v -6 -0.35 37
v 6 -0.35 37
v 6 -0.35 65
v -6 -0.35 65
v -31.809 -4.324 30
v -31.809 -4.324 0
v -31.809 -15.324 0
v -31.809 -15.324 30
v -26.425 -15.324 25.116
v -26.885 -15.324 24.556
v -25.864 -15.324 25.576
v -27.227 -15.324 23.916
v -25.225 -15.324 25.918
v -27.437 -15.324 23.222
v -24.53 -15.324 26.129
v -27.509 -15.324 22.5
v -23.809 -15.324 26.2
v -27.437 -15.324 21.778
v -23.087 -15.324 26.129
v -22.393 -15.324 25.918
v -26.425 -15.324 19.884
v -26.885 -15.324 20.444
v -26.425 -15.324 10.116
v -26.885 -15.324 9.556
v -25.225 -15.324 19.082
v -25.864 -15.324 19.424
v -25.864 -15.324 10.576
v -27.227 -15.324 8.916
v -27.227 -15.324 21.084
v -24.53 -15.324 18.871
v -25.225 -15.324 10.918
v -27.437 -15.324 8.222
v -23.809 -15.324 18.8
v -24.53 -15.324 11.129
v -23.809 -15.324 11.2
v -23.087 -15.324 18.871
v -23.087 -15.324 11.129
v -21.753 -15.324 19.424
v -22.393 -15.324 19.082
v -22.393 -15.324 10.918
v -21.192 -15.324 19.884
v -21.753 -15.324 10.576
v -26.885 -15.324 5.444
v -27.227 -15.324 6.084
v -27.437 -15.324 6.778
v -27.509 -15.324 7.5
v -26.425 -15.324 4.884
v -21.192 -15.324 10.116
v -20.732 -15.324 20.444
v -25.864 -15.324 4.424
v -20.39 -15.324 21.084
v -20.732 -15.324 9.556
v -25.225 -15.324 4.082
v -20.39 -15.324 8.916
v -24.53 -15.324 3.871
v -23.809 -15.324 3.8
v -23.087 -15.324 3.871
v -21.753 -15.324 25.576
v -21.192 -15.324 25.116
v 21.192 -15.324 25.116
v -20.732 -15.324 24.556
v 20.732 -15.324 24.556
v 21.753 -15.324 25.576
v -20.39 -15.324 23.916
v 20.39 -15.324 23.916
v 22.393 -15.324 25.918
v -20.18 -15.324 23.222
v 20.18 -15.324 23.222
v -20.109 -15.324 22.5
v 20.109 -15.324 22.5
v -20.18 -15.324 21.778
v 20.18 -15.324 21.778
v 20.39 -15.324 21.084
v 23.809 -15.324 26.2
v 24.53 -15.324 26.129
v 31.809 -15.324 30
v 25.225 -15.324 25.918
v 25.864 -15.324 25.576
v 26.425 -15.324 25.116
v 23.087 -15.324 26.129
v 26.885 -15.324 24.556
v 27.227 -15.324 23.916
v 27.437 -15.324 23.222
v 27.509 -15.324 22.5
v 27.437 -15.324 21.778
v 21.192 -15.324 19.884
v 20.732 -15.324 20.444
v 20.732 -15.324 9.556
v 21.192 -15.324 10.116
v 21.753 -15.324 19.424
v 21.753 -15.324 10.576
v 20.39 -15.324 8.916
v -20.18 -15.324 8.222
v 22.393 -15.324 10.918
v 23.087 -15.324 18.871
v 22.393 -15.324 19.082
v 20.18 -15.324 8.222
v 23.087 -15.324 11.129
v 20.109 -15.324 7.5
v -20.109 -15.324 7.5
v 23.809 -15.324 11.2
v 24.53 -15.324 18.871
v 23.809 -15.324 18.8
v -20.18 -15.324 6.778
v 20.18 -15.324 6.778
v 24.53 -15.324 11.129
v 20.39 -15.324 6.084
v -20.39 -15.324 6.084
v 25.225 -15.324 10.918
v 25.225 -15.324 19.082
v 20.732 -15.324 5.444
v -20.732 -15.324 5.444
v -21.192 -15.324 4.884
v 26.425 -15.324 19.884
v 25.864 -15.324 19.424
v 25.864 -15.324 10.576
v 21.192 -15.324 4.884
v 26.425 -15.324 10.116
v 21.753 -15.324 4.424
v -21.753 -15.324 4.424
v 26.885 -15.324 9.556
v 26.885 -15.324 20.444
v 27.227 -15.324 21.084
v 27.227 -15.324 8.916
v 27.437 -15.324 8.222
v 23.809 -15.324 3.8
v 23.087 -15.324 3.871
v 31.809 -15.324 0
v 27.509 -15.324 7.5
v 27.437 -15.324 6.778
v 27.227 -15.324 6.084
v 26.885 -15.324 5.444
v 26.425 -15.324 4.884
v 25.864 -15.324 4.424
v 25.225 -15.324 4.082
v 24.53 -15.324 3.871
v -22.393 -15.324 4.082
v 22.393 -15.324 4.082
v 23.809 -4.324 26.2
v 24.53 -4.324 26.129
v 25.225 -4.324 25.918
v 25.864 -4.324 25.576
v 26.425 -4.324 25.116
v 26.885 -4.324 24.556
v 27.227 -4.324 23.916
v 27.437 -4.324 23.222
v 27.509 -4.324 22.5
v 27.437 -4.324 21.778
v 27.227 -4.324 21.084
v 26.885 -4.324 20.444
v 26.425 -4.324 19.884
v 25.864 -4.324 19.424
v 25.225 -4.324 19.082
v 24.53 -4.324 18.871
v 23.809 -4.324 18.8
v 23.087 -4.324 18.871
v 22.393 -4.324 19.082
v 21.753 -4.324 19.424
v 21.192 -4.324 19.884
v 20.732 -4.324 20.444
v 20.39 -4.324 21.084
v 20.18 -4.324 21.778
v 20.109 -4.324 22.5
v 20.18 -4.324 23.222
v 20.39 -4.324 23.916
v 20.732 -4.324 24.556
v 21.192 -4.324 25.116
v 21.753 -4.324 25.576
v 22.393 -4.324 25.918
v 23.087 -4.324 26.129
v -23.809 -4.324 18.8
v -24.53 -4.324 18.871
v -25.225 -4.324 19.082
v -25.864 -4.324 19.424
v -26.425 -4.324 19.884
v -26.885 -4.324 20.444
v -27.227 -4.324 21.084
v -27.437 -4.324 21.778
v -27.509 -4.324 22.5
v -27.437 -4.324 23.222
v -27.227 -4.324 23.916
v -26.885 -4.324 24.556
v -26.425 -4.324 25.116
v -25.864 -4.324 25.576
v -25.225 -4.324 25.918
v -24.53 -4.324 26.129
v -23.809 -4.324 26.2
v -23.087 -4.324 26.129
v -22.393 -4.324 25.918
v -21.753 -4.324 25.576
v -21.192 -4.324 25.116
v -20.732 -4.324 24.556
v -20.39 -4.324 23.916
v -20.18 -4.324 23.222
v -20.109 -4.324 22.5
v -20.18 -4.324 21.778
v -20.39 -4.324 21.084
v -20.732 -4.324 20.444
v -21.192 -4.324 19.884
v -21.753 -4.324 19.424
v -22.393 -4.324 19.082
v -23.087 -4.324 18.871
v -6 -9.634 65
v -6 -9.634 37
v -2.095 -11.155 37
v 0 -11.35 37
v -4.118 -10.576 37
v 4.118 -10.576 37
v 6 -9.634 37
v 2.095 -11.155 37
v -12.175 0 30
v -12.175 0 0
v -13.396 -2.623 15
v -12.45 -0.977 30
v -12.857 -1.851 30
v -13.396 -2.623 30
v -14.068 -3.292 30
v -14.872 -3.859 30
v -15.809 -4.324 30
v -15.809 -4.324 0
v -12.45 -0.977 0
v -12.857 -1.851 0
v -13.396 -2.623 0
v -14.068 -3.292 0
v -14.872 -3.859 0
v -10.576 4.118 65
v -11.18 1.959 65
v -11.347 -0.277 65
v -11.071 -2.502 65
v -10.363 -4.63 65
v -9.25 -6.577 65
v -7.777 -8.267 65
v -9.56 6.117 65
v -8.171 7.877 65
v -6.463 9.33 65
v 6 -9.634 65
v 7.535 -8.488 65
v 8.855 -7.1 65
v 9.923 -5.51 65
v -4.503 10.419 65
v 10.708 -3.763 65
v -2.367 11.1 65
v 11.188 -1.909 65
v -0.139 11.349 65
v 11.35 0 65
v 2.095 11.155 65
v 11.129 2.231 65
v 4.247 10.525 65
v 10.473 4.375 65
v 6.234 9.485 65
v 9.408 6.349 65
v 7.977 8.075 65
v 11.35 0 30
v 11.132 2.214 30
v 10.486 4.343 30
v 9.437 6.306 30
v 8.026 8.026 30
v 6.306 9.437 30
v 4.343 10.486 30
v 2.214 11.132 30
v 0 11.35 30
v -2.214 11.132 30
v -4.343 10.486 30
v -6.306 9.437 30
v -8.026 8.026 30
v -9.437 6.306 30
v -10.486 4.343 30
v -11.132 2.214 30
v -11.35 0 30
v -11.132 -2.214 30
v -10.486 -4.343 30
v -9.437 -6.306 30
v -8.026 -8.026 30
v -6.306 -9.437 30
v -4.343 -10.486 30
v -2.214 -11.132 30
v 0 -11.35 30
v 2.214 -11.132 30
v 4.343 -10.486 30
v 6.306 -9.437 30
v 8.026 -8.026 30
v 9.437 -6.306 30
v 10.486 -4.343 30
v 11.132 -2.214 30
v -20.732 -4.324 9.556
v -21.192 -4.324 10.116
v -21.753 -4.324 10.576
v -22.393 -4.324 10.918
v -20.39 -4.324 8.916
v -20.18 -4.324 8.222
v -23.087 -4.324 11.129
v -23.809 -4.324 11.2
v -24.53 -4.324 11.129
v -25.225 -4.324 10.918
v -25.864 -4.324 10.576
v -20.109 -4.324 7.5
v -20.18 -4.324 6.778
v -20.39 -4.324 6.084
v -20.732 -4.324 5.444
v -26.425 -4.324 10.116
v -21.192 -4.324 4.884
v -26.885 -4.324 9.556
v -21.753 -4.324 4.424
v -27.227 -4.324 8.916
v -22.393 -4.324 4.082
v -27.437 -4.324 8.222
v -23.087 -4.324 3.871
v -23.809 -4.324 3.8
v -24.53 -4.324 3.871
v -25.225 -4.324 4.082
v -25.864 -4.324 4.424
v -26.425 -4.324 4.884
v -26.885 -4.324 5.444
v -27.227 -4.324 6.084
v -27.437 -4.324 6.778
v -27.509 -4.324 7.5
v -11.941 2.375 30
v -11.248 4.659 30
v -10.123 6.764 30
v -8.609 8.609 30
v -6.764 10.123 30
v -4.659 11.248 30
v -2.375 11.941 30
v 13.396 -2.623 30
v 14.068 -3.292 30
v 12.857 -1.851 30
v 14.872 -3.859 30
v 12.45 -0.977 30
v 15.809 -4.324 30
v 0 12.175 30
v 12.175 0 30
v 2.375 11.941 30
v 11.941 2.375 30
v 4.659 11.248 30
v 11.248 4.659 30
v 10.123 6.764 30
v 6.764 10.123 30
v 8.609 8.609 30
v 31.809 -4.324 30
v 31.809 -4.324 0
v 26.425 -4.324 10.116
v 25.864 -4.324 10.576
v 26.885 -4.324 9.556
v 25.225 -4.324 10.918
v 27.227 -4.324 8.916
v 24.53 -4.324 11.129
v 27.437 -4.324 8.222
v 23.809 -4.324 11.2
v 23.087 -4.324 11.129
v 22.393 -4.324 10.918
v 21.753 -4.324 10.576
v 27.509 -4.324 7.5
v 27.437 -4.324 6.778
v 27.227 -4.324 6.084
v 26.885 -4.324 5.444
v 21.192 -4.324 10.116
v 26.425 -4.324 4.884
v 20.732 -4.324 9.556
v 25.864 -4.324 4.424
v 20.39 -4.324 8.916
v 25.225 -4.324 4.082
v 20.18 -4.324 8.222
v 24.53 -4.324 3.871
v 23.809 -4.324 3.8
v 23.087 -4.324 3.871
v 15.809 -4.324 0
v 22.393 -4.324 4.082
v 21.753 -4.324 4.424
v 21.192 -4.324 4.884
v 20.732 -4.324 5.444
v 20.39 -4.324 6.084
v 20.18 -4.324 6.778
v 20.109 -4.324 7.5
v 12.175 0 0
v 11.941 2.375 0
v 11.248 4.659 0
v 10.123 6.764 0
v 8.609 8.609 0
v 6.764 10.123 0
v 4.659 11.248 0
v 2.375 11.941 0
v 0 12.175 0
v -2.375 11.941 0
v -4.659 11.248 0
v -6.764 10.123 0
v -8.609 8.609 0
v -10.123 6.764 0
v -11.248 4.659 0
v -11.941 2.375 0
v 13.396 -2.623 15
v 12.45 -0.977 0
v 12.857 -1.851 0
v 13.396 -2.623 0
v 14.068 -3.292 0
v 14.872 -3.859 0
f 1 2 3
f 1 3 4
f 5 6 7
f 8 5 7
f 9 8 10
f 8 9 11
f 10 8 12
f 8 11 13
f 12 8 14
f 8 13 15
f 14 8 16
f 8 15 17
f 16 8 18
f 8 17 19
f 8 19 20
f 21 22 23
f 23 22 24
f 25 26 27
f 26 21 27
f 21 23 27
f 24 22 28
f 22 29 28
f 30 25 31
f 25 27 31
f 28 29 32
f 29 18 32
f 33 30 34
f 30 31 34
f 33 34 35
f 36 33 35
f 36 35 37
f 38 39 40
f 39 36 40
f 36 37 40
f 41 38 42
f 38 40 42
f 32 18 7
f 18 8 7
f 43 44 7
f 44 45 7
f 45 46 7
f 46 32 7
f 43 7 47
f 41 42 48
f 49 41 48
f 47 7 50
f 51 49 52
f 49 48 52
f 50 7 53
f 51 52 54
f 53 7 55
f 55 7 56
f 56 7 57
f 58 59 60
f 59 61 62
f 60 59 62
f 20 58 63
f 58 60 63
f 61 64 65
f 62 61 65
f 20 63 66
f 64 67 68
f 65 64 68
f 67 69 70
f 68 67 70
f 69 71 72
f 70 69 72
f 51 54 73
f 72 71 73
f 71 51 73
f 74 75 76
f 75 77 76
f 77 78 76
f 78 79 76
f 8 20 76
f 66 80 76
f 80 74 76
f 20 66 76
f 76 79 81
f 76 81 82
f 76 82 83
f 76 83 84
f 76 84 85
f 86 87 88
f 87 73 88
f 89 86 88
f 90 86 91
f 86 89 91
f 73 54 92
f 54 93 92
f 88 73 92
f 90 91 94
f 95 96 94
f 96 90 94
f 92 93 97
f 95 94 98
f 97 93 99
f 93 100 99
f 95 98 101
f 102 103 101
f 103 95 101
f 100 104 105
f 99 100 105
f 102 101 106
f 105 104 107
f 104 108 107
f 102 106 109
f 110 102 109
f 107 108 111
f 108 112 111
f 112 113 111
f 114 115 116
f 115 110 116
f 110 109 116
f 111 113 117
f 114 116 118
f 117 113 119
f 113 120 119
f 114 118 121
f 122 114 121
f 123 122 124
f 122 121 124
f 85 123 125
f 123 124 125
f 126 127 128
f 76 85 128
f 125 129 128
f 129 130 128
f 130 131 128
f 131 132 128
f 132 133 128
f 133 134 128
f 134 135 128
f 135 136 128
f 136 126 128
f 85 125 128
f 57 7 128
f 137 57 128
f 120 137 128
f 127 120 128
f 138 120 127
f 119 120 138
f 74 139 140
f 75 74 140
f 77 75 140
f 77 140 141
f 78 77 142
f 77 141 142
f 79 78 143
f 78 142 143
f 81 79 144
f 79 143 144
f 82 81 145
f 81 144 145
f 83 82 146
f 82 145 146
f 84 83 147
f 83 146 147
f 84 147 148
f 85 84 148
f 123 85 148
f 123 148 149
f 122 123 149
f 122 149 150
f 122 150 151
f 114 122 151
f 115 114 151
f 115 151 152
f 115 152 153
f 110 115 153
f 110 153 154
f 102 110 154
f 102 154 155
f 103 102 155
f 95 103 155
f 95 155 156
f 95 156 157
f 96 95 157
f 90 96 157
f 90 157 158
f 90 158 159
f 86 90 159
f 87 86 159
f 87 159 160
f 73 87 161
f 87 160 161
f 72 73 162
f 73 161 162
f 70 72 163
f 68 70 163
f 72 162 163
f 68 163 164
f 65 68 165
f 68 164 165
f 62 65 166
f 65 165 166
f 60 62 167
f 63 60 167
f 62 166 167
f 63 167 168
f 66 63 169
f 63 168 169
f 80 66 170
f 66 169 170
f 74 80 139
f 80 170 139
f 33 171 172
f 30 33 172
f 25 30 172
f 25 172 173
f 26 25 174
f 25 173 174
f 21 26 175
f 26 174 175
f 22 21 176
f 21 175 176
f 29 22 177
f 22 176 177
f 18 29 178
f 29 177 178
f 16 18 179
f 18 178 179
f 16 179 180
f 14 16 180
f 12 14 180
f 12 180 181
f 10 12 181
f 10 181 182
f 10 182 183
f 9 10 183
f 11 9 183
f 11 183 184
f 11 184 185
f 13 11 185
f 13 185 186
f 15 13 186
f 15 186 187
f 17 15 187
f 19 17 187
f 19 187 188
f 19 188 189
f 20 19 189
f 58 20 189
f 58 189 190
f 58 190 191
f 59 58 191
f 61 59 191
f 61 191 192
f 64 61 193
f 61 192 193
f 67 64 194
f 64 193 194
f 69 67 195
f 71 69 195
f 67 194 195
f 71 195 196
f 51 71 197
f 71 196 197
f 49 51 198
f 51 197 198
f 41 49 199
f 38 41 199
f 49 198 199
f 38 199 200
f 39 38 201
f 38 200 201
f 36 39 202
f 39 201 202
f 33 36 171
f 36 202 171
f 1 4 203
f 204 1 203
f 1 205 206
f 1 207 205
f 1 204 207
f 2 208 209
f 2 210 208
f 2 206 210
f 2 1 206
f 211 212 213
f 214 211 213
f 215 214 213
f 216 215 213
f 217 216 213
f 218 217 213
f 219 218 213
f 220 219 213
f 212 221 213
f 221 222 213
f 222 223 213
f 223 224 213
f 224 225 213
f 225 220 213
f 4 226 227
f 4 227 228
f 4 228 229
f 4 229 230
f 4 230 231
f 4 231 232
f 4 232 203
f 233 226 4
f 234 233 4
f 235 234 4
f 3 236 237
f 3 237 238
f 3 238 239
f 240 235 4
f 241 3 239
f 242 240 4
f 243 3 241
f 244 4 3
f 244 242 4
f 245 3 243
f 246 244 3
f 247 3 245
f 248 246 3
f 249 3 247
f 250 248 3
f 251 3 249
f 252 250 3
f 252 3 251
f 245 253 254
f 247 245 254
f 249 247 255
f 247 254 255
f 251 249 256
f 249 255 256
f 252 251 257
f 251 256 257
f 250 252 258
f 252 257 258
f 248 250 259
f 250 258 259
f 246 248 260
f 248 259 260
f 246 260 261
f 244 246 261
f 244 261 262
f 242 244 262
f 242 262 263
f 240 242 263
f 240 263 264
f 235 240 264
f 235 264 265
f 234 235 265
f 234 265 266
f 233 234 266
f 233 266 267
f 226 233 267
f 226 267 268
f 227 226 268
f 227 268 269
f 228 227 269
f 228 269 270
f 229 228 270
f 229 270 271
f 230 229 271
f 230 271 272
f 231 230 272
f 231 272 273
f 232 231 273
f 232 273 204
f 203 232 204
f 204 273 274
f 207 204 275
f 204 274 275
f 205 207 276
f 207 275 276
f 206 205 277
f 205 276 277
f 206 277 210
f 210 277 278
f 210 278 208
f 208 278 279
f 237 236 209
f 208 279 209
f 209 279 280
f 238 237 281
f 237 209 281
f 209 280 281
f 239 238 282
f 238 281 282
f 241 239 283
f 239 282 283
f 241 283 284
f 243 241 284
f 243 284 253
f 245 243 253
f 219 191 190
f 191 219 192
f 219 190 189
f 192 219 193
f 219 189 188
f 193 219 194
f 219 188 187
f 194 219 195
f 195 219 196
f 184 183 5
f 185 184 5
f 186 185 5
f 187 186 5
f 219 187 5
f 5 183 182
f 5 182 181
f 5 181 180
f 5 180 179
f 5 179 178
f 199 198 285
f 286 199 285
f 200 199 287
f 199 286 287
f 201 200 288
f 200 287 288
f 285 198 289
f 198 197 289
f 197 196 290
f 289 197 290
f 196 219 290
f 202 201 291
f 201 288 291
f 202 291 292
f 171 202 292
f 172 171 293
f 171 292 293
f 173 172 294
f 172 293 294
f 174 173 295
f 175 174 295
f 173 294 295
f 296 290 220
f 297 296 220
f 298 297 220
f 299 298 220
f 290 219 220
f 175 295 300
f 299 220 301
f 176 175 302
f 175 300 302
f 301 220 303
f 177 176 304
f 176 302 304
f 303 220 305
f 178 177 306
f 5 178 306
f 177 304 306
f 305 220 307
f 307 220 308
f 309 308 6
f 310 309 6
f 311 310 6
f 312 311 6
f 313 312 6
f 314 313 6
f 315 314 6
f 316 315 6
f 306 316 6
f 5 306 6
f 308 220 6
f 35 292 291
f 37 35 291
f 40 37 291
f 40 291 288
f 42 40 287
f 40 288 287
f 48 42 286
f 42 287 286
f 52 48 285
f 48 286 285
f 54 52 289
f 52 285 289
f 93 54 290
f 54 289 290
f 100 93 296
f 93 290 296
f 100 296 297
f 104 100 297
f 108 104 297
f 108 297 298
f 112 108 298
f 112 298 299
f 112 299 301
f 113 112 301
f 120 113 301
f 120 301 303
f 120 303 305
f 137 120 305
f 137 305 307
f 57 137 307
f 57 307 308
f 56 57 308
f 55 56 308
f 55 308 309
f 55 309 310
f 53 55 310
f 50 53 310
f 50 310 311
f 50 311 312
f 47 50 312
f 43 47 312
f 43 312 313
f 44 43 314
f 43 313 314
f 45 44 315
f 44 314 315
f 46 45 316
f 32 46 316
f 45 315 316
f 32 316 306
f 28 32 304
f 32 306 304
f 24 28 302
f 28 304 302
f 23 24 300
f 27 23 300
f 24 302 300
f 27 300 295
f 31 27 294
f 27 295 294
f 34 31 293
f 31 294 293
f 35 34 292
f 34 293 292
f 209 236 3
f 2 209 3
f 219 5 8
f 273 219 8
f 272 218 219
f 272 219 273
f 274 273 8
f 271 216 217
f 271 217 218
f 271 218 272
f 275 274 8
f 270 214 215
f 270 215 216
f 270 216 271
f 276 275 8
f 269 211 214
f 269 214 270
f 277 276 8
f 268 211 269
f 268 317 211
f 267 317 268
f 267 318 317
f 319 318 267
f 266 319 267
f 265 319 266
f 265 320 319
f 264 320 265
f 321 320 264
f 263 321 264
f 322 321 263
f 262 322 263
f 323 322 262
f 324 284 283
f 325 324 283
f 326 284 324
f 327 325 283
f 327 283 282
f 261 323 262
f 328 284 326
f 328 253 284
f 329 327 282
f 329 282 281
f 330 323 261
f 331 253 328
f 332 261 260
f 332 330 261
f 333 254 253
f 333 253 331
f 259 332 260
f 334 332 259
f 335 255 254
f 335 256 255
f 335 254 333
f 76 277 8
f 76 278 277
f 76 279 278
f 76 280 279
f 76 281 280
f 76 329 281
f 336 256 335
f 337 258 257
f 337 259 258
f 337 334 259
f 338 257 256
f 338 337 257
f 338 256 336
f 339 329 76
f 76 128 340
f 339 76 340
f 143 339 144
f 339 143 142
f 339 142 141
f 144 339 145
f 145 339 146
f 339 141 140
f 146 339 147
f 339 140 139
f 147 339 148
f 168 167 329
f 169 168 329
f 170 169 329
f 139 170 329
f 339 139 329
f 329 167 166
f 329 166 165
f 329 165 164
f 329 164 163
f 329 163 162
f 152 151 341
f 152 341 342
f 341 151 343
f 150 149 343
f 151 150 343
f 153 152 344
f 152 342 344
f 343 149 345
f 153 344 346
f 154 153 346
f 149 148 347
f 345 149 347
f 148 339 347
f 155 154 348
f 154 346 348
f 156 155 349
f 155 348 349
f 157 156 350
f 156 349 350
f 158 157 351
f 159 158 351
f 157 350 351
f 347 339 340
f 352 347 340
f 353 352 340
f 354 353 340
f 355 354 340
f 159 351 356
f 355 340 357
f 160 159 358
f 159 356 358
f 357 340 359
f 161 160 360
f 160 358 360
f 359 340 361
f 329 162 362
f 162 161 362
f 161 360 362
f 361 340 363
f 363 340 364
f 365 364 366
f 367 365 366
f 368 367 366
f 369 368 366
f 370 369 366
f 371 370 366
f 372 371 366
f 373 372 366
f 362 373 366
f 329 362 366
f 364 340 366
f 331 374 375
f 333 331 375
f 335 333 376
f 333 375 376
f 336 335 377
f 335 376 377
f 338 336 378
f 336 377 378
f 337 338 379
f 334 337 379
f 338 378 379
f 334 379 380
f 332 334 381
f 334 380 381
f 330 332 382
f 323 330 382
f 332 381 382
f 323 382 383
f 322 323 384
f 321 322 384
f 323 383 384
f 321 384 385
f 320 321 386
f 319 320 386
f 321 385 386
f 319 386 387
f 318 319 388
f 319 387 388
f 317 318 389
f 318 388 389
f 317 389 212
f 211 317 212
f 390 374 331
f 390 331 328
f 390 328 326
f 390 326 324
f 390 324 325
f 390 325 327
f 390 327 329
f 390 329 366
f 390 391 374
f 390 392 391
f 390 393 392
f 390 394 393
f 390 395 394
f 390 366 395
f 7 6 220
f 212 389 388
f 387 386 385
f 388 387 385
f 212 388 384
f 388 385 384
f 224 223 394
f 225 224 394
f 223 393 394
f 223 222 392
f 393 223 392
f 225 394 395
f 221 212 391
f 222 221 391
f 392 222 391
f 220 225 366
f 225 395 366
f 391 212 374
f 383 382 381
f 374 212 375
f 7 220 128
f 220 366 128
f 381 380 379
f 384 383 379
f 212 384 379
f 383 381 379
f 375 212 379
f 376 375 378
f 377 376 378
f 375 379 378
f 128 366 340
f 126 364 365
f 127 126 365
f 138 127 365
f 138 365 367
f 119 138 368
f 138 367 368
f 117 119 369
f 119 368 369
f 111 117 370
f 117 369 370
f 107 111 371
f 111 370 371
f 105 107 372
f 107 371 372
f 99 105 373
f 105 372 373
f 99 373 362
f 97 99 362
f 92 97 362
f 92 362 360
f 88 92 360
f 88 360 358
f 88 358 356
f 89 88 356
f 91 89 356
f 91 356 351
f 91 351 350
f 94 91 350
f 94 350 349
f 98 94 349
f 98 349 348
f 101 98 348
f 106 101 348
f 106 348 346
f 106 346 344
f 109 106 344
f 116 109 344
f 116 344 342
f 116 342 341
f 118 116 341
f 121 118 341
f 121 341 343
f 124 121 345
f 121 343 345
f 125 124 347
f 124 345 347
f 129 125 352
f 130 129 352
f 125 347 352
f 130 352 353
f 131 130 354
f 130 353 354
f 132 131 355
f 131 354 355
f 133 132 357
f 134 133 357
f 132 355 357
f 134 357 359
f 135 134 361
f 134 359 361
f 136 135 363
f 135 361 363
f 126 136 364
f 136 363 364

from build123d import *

# Parameters (mm, degrees)
BOSS_EXTRUDE1_DEPTH = 30
SKETCH2_R           = 11.35
BOSS_EXTRUDE2_DEPTH = 35
SKETCH3_R           = 3.7
CUT_EXTRUDE1_DEPTH  = 75.22257831
CUT_EXTRUDE2_DEPTH  = 28


with BuildPart() as part:
    # Sketch1 → Boss-Extrude1 (new body)
    with BuildSketch(Plane.XY):
        with BuildLine():
            Line((-31.808576883, -15.32365322), (31.808576883, -15.32365322))
            Line((31.808576883, -15.32365322), (31.808576883, -4.32365322))
            Line((31.808576883, -4.32365322), (15.808576883, -4.32365322))
            add(Edge.make_bspline(
                [(12.175, 0), (12.801032904, -3.083922052), (15.808576883, -4.32365322)],
                knots=[0, 0, 0, 1, 1, 1], degree=2))
            ThreePointArc((12.175, 0), (0, 12.175), (-12.175, 0))
            add(Edge.make_bspline(
                [(-12.175, 0), (-12.801032904, -3.083922052), (-15.808576883, -4.32365322)],
                knots=[0, 0, 0, 1, 1, 1], degree=2))
            Line((-15.808576883, -4.32365322), (-31.808576883, -4.32365322))
            Line((-31.808576883, -4.32365322), (-31.808576883, -15.32365322))
        make_face()
    extrude(amount=BOSS_EXTRUDE1_DEPTH)

    # Sketch2 → Boss-Extrude2 (add)
    with BuildSketch(Plane.XY.offset(30)):
        Circle(SKETCH2_R)
    extrude(amount=BOSS_EXTRUDE2_DEPTH)

    # Sketch3 → Cut-Extrude1 (cut, through all)
    with BuildSketch(Plane(origin=(0, -4.32365322, 0), x_dir=(1, 0, 0), z_dir=(0, 1, 0))):
        with Locations(Location((-23.808576883, -7.5, 0), (0, 0, 270))):
            Circle(SKETCH3_R)
        with Locations(Location((-23.808576883, -22.5, 0), (0, 0, 90))):
            Circle(SKETCH3_R)
        with Locations(Location((23.808576883, -22.5, 0), (0, 0, 270))):
            Circle(SKETCH3_R)
        with Locations(Location((23.808576883, -7.5, 0), (0, 0, 90))):
            Circle(SKETCH3_R)
    extrude(amount=-CUT_EXTRUDE1_DEPTH, mode=Mode.SUBTRACT)

    # Sketch5 → Cut-Extrude2 (cut)
    with BuildSketch(Plane.XY.offset(65)):
        Polygon((-3.75, -11.35), (3.75, -11.35), (6, -11.35), (6, -0.35), (-6, -0.35), (-6, -11.35), align=None)
    extrude(amount=-CUT_EXTRUDE2_DEPTH, mode=Mode.SUBTRACT)


solid = part.part
